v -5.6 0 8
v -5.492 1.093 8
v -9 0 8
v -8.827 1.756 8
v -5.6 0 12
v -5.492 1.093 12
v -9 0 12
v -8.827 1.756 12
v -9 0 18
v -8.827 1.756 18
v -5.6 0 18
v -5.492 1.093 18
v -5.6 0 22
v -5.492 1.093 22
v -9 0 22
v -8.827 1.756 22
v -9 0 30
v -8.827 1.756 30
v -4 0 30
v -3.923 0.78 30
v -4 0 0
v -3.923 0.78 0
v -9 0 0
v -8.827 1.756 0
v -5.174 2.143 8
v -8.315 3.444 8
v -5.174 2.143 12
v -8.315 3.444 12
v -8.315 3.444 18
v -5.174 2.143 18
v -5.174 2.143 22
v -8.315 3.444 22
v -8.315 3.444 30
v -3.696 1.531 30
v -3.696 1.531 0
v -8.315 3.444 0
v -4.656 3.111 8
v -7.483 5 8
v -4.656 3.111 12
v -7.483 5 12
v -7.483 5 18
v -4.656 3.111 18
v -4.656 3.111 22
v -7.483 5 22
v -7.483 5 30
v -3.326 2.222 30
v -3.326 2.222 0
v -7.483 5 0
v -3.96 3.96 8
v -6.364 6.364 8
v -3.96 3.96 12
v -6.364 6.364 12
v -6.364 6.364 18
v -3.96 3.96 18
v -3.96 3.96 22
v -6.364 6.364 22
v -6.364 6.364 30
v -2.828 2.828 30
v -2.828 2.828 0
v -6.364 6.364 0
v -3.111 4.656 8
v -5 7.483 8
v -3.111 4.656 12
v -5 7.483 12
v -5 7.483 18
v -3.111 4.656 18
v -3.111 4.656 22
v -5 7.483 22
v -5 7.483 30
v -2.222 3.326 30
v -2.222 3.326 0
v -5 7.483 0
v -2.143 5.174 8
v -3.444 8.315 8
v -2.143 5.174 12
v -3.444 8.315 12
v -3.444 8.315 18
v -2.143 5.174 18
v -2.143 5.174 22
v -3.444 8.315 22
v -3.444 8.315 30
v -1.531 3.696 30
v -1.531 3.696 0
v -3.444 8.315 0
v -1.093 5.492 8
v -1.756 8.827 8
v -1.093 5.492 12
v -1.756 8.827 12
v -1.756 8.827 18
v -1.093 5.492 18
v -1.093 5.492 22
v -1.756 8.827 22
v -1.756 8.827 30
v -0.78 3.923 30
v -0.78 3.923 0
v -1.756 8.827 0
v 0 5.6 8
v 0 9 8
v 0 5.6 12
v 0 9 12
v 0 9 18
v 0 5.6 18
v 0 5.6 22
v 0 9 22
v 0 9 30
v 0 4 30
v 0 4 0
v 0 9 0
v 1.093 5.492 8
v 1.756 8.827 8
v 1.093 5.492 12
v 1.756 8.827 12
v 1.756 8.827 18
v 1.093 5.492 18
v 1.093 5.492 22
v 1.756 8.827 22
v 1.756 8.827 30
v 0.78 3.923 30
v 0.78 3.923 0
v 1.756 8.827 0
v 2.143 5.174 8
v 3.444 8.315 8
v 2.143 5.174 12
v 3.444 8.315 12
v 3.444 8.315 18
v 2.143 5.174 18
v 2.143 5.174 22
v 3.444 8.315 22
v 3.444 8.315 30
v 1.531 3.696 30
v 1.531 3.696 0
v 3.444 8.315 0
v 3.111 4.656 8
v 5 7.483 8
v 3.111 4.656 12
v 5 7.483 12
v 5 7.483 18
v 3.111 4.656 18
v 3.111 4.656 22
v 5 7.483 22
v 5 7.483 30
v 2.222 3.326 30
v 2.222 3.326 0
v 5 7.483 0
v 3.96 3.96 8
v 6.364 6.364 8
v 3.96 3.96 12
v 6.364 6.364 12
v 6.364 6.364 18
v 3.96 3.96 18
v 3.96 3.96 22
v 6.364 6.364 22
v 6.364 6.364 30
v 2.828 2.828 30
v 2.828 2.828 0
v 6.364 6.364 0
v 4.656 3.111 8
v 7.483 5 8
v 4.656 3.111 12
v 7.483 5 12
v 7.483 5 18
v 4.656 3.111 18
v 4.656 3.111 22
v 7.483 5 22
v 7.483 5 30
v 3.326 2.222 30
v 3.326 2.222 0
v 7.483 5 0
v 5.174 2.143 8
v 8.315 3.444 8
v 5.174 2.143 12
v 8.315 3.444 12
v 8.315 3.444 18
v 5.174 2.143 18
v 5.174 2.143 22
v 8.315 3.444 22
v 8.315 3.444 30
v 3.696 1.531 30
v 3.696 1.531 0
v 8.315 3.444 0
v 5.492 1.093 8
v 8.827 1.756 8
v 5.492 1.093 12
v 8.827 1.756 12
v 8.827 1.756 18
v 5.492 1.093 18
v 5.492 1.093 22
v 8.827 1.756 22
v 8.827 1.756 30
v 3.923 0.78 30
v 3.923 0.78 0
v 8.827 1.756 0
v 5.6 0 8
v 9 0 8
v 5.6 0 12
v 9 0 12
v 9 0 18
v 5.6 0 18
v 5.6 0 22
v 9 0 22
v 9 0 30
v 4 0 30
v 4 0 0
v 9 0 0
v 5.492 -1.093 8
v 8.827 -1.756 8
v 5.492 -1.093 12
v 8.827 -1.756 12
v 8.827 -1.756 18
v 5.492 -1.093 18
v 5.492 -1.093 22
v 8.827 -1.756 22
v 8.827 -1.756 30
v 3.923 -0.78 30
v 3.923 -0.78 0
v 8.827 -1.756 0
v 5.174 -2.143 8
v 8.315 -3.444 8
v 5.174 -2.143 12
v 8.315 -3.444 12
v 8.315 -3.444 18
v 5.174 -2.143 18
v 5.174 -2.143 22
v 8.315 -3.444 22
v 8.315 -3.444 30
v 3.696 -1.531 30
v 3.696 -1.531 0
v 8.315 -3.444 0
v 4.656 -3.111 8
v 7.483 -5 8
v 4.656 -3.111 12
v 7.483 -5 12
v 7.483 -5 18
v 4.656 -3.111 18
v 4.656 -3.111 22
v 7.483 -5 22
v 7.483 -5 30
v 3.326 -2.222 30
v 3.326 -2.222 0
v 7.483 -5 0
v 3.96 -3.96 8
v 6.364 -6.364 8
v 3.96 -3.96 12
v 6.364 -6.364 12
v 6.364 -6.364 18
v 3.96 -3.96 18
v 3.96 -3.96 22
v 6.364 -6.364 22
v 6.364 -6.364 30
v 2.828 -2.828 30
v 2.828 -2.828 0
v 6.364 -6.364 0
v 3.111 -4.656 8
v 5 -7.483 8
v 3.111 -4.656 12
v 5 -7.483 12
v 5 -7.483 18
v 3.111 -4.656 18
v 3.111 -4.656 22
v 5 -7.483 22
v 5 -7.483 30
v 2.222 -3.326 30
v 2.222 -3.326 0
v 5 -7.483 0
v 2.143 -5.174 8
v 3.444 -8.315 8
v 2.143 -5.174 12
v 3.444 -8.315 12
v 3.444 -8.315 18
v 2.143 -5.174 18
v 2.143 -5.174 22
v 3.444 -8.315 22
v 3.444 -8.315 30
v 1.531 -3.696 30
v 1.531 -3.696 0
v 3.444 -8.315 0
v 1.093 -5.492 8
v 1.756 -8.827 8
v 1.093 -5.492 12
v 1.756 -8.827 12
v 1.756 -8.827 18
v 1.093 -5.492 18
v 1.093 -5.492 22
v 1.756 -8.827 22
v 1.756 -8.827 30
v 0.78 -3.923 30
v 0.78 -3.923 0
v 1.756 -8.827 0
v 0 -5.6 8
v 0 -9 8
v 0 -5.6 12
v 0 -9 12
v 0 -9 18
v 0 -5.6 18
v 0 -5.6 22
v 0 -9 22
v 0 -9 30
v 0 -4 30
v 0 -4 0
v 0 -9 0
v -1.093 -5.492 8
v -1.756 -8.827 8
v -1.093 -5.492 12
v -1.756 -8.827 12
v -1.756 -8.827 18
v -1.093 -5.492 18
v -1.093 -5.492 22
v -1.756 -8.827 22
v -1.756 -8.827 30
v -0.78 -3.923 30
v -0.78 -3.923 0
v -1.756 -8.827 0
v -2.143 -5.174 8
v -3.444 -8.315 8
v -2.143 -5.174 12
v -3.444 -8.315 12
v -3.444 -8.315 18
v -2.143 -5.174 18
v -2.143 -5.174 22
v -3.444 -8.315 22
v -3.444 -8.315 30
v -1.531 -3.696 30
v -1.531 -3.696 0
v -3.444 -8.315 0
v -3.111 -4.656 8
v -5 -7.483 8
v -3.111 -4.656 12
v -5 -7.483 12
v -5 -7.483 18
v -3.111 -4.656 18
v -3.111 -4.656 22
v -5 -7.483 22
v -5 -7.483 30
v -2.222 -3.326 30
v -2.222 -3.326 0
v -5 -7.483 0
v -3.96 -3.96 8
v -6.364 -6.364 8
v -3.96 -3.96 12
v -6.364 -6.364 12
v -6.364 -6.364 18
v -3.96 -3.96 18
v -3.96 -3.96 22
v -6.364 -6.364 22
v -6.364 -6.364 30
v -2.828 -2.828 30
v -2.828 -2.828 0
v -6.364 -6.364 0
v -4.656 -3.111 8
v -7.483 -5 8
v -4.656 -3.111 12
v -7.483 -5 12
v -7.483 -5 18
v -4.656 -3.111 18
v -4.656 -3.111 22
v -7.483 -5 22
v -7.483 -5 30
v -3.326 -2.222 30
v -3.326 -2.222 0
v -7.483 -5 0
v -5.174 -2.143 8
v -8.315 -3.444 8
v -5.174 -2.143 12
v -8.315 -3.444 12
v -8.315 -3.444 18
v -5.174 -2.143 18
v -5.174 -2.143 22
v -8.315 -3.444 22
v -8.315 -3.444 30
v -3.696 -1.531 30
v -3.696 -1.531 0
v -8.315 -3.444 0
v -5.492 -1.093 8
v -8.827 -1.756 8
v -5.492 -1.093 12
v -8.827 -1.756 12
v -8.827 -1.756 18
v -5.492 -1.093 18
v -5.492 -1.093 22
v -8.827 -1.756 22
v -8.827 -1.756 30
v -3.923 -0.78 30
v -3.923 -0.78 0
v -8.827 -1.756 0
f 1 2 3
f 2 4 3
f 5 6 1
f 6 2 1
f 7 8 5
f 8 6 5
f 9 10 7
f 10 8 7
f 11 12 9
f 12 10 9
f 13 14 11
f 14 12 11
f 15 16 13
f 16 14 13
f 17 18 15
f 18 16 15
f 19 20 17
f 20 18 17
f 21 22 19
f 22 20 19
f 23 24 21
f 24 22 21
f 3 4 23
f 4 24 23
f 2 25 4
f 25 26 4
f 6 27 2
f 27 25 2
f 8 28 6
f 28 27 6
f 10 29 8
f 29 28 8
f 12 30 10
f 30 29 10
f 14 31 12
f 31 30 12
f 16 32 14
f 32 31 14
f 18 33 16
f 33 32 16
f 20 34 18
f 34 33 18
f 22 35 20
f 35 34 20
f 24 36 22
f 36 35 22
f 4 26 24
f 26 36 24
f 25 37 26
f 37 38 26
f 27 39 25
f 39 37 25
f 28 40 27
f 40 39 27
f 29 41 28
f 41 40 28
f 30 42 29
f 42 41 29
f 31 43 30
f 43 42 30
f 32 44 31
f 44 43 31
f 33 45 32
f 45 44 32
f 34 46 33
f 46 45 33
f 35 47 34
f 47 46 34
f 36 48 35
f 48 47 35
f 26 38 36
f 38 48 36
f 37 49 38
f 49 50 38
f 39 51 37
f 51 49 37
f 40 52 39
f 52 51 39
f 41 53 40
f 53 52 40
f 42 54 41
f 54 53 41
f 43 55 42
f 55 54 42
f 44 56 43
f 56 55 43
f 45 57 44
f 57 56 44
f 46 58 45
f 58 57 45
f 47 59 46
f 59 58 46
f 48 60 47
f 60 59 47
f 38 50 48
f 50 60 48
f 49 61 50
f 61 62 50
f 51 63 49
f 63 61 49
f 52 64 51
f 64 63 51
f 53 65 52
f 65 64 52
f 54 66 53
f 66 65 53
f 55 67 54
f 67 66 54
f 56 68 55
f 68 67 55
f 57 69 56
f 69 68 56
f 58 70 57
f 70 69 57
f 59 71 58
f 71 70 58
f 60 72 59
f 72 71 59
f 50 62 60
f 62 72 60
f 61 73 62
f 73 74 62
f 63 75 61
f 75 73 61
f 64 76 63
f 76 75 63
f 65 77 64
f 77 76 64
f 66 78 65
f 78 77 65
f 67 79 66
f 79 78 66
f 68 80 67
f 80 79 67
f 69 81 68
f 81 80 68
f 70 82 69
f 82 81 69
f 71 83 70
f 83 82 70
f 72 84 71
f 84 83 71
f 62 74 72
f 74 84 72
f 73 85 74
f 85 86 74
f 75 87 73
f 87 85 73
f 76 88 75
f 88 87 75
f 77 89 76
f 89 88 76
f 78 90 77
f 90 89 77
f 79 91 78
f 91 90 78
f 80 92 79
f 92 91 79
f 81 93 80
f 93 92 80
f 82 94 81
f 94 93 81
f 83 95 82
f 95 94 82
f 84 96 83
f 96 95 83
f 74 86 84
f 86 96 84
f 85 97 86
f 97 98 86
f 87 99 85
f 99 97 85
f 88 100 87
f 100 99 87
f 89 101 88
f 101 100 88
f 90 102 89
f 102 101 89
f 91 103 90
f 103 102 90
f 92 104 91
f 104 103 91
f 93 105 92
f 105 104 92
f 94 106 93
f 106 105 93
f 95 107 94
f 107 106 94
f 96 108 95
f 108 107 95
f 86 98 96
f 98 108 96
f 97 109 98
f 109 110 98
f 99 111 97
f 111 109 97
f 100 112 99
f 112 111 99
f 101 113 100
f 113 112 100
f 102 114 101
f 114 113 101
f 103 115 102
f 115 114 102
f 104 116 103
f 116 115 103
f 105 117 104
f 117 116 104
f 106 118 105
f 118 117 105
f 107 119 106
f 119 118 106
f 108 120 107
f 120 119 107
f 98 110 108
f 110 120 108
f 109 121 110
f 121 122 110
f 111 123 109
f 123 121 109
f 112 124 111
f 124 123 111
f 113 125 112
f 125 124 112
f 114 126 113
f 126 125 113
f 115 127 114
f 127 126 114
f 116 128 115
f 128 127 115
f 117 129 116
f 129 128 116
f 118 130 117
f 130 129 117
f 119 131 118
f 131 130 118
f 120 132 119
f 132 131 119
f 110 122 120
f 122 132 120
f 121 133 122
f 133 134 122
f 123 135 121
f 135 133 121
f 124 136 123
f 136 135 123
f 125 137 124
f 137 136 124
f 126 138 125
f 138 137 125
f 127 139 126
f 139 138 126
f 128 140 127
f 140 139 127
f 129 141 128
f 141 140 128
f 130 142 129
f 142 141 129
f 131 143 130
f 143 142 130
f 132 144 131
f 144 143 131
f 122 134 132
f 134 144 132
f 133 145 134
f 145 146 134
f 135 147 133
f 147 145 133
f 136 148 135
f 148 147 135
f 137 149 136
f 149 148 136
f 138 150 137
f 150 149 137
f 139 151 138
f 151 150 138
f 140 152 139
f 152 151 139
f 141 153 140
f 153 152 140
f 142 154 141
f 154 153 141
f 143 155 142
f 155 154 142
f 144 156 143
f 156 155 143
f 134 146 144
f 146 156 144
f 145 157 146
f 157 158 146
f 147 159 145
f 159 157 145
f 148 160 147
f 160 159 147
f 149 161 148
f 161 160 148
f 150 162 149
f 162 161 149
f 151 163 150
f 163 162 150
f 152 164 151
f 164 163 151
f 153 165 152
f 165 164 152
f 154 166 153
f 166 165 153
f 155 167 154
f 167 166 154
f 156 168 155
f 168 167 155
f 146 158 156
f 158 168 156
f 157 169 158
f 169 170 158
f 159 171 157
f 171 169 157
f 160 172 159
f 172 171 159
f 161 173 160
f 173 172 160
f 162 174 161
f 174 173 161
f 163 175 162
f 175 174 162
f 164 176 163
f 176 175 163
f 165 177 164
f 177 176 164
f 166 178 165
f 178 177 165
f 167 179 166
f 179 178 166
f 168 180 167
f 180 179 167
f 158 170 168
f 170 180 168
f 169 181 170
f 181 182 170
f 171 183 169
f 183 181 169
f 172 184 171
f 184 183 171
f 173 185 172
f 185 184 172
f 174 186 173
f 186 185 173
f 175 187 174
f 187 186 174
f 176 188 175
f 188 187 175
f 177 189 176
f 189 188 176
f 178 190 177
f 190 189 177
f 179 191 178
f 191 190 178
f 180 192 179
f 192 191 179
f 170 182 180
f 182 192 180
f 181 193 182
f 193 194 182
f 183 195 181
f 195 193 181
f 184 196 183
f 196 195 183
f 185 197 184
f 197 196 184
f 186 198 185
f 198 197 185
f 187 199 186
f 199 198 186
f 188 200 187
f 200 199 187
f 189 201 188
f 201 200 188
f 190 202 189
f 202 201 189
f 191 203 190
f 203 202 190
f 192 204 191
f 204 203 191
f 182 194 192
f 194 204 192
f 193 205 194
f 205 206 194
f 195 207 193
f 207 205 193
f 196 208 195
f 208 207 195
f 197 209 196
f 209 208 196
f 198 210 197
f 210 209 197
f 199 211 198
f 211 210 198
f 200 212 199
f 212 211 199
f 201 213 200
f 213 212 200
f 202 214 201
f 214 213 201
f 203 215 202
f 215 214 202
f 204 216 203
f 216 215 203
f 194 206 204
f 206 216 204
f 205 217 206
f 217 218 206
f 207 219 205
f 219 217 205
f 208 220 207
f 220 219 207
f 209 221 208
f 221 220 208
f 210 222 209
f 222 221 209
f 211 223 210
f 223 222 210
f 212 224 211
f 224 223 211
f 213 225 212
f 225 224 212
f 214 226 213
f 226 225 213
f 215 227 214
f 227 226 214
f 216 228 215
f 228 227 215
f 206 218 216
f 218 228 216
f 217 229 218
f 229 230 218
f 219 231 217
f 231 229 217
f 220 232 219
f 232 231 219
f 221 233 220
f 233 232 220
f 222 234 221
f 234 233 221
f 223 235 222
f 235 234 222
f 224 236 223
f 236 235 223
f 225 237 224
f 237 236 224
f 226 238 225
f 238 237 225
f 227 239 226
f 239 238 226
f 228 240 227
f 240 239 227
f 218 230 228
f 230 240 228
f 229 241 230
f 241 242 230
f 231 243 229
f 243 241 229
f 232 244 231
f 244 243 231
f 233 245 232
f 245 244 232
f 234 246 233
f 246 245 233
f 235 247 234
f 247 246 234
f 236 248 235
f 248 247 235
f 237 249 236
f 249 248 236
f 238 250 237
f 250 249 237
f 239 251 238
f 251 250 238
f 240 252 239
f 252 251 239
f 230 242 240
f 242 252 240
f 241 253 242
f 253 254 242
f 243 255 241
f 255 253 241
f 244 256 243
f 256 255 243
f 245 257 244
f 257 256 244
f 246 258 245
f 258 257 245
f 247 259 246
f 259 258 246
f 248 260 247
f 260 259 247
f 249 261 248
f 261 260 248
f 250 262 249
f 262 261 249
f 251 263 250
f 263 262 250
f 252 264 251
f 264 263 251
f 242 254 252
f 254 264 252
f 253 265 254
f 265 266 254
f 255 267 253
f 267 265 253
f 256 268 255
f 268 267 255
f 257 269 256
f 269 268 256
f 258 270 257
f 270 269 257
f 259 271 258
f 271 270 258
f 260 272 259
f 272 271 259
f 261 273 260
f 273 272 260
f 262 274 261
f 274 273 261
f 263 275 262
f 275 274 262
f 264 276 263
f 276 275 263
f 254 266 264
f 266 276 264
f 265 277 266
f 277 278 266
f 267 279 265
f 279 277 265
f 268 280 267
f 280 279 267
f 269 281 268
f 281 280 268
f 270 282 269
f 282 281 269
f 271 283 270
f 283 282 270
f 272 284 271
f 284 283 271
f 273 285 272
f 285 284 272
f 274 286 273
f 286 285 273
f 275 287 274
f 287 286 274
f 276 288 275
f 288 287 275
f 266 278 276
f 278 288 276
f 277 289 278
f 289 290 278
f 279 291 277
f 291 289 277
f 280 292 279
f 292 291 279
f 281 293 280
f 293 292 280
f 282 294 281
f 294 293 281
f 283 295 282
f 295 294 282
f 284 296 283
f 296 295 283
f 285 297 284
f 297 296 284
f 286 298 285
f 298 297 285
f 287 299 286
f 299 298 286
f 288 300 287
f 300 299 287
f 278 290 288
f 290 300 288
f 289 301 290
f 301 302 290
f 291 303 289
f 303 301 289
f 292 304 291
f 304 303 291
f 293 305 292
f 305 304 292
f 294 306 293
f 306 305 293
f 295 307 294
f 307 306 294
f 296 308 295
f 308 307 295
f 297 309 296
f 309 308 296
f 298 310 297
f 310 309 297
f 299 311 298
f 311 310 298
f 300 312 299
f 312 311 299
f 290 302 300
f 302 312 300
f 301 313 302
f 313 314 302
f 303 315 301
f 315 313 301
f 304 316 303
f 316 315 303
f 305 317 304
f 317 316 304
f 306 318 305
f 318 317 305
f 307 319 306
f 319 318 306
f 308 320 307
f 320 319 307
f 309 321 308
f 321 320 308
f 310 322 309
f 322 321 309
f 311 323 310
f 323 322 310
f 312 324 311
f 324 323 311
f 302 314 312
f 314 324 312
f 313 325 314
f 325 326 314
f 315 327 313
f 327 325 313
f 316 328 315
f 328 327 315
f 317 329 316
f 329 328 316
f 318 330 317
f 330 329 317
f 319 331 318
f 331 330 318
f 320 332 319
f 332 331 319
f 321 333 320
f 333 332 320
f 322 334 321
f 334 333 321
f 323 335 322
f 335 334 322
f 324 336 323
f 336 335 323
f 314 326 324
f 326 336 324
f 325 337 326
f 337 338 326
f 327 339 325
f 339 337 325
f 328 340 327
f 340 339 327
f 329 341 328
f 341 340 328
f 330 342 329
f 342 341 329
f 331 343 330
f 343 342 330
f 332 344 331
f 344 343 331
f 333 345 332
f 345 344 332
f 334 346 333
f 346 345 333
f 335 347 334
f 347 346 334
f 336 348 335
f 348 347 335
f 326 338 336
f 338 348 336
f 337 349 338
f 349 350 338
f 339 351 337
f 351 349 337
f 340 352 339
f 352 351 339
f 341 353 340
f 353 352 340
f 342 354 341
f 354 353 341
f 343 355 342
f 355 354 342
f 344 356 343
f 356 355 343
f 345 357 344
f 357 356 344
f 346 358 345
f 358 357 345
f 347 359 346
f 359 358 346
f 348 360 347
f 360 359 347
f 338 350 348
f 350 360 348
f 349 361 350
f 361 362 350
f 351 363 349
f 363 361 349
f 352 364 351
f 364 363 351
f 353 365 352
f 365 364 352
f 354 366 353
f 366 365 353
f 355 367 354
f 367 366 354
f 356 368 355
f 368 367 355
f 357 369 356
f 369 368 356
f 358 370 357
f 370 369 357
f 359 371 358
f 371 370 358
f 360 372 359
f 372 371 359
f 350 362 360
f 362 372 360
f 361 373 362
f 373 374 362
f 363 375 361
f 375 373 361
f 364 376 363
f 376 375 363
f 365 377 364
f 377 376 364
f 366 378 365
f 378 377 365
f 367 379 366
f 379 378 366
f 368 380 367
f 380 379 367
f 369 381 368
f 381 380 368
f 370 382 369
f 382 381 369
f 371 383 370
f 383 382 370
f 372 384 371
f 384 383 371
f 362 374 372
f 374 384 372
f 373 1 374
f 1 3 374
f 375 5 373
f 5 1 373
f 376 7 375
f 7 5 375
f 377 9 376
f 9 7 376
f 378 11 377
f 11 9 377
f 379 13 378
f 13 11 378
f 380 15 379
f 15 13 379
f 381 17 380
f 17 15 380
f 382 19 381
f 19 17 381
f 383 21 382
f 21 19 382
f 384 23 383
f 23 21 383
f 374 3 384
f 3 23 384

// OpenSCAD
$fn = 32;

// ----------------------------------------------------------------------
// Grooved revolve: stepped, bore R4
// ----------------------------------------------------------------------

// --- parameters (mm) ---
bore_r = 4;               // bore radius
outer_r = 9;              // outer radius of the body
total_h = 30;             // overall height, Z
wall = 5;                 // radial wall thickness
groove_w = 4;             // groove width
groove_d = 3.4;           // groove depth
grooves = 2;              // number of outer grooves

bbox_x = 2 * outer_r;  // full diameter
bore_d = 2 * bore_r;  // bore diameter
body_d = 2 * outer_r;  // body diameter
revolve_angle = 360;  // full turn around the Z axis

profile = [[4, 0], [9, 0], [9, 8], [5.6, 8], [5.6, 12], [9, 12], [9, 18], [5.6, 18], [5.6, 22], [9, 22], [9, 30], [4, 30]];  // primary outline, 12 points, counter clockwise

// --- the one profile operation ---
rotate_extrude(angle = revolve_angle) polygon(points = profile);
